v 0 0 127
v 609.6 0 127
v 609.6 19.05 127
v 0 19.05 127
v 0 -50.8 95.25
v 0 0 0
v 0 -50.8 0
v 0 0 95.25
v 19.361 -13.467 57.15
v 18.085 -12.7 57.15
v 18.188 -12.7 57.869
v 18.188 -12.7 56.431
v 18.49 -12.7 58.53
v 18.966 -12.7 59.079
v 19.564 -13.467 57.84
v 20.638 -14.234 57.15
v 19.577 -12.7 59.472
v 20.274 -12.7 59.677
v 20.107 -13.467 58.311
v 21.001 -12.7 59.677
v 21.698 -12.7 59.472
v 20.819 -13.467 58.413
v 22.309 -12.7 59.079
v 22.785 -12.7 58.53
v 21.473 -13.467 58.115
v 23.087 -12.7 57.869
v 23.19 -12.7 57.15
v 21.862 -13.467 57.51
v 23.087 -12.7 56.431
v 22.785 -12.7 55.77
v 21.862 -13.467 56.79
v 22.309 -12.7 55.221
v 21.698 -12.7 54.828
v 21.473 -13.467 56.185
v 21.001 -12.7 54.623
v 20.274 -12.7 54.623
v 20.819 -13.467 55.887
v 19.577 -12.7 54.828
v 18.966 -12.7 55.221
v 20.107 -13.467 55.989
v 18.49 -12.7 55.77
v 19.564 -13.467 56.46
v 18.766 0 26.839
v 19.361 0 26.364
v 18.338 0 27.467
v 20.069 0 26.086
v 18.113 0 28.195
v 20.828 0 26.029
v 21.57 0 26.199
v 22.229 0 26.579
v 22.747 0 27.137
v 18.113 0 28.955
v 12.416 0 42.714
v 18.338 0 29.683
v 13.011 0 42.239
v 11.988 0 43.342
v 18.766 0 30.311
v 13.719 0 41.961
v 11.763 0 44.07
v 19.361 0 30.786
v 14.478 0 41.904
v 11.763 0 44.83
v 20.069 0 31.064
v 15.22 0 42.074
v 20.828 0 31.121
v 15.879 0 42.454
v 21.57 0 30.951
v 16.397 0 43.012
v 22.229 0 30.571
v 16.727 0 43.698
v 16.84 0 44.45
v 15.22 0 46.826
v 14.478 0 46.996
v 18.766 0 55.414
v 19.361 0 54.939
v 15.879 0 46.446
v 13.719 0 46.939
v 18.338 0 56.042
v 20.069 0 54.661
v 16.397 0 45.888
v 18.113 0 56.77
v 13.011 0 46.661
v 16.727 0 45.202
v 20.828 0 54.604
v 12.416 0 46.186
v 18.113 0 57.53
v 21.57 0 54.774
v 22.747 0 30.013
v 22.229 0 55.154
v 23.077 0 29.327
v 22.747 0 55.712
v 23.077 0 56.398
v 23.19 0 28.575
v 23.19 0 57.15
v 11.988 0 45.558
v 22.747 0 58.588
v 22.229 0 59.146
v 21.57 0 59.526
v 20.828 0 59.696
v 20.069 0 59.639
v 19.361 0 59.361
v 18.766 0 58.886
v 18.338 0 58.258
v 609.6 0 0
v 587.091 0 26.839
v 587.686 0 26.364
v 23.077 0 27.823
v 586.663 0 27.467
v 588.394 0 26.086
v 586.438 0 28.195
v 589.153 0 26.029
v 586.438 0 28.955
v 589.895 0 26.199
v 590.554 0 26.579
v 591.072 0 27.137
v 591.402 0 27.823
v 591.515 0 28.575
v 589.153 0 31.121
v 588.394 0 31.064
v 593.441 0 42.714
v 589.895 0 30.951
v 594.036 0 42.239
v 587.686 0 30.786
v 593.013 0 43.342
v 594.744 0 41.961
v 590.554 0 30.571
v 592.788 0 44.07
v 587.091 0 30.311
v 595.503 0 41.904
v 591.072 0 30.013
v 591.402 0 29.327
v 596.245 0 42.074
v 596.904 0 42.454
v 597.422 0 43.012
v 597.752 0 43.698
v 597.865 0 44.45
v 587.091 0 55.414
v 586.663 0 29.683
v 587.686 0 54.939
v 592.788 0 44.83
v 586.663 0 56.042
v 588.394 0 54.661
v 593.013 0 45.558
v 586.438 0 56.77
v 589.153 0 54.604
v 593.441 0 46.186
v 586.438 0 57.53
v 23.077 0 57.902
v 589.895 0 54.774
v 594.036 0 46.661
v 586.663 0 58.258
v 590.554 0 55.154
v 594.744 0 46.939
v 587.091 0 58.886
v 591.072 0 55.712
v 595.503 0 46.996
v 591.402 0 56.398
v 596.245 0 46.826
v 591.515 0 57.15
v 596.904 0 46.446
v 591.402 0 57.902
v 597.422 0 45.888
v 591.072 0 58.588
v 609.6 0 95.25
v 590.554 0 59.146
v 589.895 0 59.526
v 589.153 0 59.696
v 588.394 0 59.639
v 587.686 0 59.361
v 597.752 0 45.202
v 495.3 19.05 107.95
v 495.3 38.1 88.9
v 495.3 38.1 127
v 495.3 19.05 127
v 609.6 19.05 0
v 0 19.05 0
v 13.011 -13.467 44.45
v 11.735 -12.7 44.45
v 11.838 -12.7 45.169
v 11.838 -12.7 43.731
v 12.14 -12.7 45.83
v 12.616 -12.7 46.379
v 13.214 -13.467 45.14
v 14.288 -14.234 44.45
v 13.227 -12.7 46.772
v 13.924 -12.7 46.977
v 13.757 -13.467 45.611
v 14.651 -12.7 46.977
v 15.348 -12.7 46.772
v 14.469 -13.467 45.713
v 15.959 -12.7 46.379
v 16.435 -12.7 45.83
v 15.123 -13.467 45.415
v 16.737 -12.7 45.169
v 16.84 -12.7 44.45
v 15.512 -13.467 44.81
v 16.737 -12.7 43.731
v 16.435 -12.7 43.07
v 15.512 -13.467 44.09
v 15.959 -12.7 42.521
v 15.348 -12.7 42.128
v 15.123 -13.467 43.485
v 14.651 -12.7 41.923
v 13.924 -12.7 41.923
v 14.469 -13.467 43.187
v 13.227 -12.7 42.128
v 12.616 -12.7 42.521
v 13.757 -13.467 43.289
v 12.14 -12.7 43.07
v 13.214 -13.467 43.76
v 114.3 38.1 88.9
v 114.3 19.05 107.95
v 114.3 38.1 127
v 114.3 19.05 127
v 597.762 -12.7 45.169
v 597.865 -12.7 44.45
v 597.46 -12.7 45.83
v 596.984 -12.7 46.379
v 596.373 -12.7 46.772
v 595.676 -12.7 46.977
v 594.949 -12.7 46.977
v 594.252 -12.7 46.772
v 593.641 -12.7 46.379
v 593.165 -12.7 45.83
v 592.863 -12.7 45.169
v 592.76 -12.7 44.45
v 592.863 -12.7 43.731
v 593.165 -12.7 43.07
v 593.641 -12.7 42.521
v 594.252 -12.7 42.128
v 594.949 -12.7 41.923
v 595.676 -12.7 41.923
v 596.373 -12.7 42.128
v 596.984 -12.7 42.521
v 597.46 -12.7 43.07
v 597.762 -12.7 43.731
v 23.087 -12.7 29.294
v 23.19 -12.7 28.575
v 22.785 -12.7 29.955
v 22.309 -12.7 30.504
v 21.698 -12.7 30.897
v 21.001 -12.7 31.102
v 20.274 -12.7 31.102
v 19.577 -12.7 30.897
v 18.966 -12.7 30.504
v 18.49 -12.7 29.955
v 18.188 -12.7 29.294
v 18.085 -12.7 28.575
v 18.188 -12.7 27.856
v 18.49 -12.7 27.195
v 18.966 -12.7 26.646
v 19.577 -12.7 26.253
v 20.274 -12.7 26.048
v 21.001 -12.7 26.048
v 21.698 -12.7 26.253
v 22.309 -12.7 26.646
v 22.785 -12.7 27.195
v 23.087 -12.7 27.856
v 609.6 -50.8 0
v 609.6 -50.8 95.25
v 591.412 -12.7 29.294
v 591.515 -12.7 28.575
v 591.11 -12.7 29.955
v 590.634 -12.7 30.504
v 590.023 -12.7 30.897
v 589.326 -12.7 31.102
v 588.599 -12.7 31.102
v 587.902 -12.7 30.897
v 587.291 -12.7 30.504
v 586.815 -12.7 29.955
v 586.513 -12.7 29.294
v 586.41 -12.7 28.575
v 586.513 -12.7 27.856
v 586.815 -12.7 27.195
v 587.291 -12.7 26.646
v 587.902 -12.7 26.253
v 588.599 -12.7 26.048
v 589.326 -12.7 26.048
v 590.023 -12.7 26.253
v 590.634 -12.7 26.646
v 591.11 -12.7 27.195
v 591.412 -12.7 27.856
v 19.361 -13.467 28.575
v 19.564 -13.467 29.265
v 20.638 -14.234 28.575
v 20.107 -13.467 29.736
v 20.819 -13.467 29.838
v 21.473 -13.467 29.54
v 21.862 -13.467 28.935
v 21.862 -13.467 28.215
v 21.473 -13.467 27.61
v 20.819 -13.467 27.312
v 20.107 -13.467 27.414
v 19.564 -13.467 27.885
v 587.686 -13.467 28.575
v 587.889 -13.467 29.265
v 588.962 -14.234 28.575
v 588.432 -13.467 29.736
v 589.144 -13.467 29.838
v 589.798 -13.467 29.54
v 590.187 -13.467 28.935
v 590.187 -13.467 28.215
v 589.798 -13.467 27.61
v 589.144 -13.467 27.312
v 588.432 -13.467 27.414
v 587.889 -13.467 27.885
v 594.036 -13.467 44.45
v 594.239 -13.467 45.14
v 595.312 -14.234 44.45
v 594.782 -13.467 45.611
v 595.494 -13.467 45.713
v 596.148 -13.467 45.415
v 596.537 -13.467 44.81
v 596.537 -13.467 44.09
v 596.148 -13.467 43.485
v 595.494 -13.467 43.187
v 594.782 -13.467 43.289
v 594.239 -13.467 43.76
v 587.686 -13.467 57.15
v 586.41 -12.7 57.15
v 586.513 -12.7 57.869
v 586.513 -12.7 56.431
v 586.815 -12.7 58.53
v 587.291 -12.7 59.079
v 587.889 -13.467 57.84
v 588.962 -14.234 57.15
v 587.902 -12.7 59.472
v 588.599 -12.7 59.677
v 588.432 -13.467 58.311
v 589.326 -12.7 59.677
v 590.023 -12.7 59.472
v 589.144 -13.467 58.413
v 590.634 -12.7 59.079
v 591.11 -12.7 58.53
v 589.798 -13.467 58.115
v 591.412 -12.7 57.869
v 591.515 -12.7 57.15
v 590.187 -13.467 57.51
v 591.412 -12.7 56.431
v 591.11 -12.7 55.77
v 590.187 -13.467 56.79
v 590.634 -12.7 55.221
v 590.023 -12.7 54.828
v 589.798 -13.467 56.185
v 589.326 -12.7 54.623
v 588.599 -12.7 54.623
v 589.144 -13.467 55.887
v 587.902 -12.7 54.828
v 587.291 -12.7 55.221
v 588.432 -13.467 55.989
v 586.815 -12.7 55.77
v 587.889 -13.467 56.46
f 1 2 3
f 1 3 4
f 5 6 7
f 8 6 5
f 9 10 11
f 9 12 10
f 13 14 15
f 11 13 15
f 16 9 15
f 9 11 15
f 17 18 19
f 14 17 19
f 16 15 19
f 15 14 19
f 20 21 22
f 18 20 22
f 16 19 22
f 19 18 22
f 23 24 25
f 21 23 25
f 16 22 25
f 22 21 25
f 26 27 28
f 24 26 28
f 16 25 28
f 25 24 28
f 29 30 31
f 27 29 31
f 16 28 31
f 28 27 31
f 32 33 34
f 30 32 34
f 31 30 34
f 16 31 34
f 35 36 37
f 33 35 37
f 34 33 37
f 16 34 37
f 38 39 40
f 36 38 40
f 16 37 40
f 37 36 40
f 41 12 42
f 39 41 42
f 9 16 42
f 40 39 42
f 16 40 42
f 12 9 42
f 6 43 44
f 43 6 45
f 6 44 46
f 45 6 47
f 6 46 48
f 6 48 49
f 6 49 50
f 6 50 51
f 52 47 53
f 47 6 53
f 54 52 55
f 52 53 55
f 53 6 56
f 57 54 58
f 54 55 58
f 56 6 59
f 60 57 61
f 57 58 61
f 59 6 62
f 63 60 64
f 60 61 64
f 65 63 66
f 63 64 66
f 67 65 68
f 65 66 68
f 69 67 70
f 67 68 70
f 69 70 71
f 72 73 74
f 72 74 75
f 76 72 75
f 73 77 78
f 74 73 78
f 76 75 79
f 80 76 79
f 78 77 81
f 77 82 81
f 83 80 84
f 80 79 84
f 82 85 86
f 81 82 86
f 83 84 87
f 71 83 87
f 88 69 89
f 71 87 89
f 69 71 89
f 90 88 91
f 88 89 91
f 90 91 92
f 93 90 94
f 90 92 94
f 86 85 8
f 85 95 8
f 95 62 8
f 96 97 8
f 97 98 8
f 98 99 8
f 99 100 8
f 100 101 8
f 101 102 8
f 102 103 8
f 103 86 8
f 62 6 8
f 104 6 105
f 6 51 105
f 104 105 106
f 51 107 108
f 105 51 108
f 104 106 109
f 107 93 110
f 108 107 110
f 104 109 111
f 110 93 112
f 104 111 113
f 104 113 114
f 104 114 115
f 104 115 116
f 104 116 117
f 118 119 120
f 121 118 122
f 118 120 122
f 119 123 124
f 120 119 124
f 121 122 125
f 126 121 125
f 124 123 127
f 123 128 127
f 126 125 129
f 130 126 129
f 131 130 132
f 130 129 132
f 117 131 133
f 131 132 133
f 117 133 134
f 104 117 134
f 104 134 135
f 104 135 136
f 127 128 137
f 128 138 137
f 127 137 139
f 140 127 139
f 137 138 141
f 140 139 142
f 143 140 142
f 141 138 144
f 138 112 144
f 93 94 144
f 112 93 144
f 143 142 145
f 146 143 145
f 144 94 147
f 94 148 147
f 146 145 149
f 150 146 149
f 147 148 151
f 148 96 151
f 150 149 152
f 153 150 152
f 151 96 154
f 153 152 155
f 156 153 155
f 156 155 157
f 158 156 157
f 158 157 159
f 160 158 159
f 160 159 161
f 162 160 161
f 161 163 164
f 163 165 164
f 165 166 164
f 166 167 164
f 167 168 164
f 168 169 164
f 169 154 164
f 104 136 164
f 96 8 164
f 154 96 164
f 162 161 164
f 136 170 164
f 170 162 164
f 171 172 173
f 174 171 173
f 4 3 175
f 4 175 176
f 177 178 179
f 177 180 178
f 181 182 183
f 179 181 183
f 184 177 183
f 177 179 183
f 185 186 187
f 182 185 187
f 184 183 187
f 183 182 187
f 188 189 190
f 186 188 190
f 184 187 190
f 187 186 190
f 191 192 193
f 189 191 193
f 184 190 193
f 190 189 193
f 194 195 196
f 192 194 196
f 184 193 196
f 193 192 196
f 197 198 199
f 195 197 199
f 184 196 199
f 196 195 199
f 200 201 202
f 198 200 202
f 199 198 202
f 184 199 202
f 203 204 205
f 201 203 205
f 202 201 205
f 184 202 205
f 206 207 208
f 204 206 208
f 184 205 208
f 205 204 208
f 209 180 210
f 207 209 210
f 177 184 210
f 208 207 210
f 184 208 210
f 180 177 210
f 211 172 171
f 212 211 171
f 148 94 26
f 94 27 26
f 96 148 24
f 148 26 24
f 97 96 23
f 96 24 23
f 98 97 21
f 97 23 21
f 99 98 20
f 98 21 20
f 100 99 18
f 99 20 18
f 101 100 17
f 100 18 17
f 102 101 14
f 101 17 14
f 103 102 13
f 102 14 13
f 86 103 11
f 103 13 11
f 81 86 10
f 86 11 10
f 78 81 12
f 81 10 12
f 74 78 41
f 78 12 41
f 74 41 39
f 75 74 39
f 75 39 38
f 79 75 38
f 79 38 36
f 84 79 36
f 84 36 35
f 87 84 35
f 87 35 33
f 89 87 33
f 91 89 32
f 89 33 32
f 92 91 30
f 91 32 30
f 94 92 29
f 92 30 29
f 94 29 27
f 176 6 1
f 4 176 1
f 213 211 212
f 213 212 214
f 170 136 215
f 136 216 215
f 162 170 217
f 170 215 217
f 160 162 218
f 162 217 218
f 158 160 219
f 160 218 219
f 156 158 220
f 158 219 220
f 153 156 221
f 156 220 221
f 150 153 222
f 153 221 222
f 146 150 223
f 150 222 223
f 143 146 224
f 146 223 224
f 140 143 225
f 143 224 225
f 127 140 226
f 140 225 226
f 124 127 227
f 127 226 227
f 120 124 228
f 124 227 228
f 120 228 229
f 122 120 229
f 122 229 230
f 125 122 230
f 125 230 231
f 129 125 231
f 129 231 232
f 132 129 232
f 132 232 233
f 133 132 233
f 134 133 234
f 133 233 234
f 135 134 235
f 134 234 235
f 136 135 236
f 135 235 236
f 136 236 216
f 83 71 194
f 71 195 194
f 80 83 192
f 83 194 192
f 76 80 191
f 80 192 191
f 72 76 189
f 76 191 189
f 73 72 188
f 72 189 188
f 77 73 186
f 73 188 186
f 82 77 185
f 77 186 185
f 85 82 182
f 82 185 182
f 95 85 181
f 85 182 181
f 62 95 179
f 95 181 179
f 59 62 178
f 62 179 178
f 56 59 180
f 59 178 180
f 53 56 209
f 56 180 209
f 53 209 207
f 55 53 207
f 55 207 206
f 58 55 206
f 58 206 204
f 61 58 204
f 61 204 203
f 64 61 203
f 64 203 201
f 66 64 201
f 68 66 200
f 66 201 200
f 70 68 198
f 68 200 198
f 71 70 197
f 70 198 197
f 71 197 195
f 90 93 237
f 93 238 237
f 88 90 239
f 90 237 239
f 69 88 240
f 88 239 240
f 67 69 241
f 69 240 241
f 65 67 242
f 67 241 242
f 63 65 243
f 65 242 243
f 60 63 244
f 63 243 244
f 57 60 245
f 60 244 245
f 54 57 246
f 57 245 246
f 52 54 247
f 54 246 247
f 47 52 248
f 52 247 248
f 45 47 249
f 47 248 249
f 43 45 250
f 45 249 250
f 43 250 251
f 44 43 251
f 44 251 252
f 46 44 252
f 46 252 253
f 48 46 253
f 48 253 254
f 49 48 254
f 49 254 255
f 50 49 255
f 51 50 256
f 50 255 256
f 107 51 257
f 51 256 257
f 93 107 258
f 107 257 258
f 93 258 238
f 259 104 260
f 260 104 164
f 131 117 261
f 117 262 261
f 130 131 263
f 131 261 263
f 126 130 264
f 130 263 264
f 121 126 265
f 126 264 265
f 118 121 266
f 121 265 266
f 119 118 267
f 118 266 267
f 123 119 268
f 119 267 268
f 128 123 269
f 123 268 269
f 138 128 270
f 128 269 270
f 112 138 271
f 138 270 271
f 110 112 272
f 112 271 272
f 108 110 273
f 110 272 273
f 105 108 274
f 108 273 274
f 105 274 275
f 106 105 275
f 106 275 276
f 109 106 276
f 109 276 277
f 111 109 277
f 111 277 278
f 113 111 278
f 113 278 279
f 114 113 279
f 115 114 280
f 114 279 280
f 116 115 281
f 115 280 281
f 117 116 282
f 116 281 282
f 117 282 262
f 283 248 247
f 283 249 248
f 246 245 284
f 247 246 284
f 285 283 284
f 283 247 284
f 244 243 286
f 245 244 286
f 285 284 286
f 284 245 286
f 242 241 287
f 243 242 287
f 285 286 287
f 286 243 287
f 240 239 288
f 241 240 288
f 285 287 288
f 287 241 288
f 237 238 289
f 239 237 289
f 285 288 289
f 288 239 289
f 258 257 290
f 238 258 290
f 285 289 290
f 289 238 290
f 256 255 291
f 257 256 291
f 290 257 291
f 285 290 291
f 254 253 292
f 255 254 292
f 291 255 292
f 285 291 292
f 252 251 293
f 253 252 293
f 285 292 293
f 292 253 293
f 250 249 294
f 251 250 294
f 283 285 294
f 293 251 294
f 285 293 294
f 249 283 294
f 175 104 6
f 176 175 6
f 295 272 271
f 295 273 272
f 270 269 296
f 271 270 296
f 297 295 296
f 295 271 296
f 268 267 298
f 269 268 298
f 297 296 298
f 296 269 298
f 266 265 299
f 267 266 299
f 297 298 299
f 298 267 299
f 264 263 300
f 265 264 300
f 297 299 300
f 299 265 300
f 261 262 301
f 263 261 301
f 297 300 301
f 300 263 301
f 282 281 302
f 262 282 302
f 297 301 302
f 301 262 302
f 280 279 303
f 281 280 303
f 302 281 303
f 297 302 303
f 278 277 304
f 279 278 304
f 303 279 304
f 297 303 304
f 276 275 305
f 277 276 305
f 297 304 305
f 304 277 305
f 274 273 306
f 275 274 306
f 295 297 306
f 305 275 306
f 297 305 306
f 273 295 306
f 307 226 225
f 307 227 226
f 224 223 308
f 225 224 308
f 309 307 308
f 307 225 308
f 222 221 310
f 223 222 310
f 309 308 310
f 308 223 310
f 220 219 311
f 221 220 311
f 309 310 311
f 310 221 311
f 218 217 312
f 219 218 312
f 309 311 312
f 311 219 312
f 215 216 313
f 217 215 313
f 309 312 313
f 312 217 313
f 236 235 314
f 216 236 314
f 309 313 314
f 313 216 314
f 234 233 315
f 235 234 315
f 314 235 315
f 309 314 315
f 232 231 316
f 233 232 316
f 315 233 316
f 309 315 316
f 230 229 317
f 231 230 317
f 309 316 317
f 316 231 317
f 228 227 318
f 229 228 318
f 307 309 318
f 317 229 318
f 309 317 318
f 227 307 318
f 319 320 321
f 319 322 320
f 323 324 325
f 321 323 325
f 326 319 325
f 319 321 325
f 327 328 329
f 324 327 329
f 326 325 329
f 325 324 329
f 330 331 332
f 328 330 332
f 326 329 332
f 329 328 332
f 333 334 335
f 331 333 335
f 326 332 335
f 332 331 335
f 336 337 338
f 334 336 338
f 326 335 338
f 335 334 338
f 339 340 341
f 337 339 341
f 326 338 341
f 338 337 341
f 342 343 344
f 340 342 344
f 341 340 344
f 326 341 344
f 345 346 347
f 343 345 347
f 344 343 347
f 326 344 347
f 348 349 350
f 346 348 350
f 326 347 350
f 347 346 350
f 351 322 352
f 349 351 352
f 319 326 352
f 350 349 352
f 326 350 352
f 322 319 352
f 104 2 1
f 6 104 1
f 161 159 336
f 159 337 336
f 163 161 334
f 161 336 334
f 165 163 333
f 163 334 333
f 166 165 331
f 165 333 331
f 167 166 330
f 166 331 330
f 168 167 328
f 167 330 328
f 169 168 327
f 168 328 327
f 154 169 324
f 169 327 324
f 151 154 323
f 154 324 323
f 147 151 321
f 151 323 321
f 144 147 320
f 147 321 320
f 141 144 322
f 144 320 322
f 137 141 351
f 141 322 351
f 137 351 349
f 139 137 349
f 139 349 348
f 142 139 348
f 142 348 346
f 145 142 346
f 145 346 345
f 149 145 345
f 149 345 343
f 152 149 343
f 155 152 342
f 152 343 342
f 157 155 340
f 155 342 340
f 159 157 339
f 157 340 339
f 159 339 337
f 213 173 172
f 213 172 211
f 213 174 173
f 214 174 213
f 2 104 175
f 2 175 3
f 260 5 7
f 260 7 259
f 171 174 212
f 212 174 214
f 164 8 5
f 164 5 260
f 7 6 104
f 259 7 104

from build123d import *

# Parameters (mm, degrees)
F0_W     = 609.6
F0_H     = 95.25
F1_DEPTH = 50.8
F3_D     = 5.1054
F3_DEPTH = 12.7
F3_TIP   = 1.5338169022
F4_W     = 609.6
F4_H     = 127
F5_DEPTH = 19.05
F6_W     = 381
F6_H     = 38.1
F7_DEPTH = 19.05
F9_DEPTH = 495.301


with BuildPart() as f1:
    # F0 (on Front) → F1 (new body)
    with BuildSketch(Plane.XZ):
        with Locations((304.8, 47.625)):
            Rectangle(F0_W, F0_H)
    extrude(amount=F1_DEPTH)

    # F3
    with Locations(Plane(origin=(0, 0, 0), x_dir=(-1, 0, 0), z_dir=(0, 1, 0))):
        with Locations((-588.9625, 28.575), (-595.3125, 44.45), (-588.9625, 57.15), (-20.6375, 28.575), (-14.2875, 44.45), (-20.6375, 57.15)):
            Hole(F3_D / 2, depth=F3_DEPTH)
            with Locations((0, 0, -(F3_DEPTH + F3_TIP / 2))):  # 118° drill point
                Cone(0, F3_D / 2, F3_TIP, mode=Mode.SUBTRACT)


with BuildPart() as f5:
    # F4 (on face) → F5 (new body)
    with BuildSketch(Plane(origin=(0, 0, 0), x_dir=(-1, 0, 0), z_dir=(0, 1, 0))):
        with Locations((-304.8, 63.5)):
            Rectangle(F4_W, F4_H)
    extrude(amount=F5_DEPTH)


with BuildPart() as f7:
    # F6 (on face) → F7 (new body)
    with BuildSketch(Plane(origin=(0, 19.05, 0), x_dir=(-1, 0, 0), z_dir=(0, 1, 0))):
        with Locations((-304.8, 107.95)):
            Rectangle(F6_W, F6_H)
    extrude(amount=F7_DEPTH)

    # F8 (on face) → F9 (cut, through all)
    with BuildSketch(Plane.YZ.offset(495.3)):
        Polygon((19.05, 88.9), (38.1, 88.9), (19.05, 107.95), align=None)
    extrude(amount=-F9_DEPTH, mode=Mode.SUBTRACT)


solid = Compound([f1.part, f5.part, f7.part])
